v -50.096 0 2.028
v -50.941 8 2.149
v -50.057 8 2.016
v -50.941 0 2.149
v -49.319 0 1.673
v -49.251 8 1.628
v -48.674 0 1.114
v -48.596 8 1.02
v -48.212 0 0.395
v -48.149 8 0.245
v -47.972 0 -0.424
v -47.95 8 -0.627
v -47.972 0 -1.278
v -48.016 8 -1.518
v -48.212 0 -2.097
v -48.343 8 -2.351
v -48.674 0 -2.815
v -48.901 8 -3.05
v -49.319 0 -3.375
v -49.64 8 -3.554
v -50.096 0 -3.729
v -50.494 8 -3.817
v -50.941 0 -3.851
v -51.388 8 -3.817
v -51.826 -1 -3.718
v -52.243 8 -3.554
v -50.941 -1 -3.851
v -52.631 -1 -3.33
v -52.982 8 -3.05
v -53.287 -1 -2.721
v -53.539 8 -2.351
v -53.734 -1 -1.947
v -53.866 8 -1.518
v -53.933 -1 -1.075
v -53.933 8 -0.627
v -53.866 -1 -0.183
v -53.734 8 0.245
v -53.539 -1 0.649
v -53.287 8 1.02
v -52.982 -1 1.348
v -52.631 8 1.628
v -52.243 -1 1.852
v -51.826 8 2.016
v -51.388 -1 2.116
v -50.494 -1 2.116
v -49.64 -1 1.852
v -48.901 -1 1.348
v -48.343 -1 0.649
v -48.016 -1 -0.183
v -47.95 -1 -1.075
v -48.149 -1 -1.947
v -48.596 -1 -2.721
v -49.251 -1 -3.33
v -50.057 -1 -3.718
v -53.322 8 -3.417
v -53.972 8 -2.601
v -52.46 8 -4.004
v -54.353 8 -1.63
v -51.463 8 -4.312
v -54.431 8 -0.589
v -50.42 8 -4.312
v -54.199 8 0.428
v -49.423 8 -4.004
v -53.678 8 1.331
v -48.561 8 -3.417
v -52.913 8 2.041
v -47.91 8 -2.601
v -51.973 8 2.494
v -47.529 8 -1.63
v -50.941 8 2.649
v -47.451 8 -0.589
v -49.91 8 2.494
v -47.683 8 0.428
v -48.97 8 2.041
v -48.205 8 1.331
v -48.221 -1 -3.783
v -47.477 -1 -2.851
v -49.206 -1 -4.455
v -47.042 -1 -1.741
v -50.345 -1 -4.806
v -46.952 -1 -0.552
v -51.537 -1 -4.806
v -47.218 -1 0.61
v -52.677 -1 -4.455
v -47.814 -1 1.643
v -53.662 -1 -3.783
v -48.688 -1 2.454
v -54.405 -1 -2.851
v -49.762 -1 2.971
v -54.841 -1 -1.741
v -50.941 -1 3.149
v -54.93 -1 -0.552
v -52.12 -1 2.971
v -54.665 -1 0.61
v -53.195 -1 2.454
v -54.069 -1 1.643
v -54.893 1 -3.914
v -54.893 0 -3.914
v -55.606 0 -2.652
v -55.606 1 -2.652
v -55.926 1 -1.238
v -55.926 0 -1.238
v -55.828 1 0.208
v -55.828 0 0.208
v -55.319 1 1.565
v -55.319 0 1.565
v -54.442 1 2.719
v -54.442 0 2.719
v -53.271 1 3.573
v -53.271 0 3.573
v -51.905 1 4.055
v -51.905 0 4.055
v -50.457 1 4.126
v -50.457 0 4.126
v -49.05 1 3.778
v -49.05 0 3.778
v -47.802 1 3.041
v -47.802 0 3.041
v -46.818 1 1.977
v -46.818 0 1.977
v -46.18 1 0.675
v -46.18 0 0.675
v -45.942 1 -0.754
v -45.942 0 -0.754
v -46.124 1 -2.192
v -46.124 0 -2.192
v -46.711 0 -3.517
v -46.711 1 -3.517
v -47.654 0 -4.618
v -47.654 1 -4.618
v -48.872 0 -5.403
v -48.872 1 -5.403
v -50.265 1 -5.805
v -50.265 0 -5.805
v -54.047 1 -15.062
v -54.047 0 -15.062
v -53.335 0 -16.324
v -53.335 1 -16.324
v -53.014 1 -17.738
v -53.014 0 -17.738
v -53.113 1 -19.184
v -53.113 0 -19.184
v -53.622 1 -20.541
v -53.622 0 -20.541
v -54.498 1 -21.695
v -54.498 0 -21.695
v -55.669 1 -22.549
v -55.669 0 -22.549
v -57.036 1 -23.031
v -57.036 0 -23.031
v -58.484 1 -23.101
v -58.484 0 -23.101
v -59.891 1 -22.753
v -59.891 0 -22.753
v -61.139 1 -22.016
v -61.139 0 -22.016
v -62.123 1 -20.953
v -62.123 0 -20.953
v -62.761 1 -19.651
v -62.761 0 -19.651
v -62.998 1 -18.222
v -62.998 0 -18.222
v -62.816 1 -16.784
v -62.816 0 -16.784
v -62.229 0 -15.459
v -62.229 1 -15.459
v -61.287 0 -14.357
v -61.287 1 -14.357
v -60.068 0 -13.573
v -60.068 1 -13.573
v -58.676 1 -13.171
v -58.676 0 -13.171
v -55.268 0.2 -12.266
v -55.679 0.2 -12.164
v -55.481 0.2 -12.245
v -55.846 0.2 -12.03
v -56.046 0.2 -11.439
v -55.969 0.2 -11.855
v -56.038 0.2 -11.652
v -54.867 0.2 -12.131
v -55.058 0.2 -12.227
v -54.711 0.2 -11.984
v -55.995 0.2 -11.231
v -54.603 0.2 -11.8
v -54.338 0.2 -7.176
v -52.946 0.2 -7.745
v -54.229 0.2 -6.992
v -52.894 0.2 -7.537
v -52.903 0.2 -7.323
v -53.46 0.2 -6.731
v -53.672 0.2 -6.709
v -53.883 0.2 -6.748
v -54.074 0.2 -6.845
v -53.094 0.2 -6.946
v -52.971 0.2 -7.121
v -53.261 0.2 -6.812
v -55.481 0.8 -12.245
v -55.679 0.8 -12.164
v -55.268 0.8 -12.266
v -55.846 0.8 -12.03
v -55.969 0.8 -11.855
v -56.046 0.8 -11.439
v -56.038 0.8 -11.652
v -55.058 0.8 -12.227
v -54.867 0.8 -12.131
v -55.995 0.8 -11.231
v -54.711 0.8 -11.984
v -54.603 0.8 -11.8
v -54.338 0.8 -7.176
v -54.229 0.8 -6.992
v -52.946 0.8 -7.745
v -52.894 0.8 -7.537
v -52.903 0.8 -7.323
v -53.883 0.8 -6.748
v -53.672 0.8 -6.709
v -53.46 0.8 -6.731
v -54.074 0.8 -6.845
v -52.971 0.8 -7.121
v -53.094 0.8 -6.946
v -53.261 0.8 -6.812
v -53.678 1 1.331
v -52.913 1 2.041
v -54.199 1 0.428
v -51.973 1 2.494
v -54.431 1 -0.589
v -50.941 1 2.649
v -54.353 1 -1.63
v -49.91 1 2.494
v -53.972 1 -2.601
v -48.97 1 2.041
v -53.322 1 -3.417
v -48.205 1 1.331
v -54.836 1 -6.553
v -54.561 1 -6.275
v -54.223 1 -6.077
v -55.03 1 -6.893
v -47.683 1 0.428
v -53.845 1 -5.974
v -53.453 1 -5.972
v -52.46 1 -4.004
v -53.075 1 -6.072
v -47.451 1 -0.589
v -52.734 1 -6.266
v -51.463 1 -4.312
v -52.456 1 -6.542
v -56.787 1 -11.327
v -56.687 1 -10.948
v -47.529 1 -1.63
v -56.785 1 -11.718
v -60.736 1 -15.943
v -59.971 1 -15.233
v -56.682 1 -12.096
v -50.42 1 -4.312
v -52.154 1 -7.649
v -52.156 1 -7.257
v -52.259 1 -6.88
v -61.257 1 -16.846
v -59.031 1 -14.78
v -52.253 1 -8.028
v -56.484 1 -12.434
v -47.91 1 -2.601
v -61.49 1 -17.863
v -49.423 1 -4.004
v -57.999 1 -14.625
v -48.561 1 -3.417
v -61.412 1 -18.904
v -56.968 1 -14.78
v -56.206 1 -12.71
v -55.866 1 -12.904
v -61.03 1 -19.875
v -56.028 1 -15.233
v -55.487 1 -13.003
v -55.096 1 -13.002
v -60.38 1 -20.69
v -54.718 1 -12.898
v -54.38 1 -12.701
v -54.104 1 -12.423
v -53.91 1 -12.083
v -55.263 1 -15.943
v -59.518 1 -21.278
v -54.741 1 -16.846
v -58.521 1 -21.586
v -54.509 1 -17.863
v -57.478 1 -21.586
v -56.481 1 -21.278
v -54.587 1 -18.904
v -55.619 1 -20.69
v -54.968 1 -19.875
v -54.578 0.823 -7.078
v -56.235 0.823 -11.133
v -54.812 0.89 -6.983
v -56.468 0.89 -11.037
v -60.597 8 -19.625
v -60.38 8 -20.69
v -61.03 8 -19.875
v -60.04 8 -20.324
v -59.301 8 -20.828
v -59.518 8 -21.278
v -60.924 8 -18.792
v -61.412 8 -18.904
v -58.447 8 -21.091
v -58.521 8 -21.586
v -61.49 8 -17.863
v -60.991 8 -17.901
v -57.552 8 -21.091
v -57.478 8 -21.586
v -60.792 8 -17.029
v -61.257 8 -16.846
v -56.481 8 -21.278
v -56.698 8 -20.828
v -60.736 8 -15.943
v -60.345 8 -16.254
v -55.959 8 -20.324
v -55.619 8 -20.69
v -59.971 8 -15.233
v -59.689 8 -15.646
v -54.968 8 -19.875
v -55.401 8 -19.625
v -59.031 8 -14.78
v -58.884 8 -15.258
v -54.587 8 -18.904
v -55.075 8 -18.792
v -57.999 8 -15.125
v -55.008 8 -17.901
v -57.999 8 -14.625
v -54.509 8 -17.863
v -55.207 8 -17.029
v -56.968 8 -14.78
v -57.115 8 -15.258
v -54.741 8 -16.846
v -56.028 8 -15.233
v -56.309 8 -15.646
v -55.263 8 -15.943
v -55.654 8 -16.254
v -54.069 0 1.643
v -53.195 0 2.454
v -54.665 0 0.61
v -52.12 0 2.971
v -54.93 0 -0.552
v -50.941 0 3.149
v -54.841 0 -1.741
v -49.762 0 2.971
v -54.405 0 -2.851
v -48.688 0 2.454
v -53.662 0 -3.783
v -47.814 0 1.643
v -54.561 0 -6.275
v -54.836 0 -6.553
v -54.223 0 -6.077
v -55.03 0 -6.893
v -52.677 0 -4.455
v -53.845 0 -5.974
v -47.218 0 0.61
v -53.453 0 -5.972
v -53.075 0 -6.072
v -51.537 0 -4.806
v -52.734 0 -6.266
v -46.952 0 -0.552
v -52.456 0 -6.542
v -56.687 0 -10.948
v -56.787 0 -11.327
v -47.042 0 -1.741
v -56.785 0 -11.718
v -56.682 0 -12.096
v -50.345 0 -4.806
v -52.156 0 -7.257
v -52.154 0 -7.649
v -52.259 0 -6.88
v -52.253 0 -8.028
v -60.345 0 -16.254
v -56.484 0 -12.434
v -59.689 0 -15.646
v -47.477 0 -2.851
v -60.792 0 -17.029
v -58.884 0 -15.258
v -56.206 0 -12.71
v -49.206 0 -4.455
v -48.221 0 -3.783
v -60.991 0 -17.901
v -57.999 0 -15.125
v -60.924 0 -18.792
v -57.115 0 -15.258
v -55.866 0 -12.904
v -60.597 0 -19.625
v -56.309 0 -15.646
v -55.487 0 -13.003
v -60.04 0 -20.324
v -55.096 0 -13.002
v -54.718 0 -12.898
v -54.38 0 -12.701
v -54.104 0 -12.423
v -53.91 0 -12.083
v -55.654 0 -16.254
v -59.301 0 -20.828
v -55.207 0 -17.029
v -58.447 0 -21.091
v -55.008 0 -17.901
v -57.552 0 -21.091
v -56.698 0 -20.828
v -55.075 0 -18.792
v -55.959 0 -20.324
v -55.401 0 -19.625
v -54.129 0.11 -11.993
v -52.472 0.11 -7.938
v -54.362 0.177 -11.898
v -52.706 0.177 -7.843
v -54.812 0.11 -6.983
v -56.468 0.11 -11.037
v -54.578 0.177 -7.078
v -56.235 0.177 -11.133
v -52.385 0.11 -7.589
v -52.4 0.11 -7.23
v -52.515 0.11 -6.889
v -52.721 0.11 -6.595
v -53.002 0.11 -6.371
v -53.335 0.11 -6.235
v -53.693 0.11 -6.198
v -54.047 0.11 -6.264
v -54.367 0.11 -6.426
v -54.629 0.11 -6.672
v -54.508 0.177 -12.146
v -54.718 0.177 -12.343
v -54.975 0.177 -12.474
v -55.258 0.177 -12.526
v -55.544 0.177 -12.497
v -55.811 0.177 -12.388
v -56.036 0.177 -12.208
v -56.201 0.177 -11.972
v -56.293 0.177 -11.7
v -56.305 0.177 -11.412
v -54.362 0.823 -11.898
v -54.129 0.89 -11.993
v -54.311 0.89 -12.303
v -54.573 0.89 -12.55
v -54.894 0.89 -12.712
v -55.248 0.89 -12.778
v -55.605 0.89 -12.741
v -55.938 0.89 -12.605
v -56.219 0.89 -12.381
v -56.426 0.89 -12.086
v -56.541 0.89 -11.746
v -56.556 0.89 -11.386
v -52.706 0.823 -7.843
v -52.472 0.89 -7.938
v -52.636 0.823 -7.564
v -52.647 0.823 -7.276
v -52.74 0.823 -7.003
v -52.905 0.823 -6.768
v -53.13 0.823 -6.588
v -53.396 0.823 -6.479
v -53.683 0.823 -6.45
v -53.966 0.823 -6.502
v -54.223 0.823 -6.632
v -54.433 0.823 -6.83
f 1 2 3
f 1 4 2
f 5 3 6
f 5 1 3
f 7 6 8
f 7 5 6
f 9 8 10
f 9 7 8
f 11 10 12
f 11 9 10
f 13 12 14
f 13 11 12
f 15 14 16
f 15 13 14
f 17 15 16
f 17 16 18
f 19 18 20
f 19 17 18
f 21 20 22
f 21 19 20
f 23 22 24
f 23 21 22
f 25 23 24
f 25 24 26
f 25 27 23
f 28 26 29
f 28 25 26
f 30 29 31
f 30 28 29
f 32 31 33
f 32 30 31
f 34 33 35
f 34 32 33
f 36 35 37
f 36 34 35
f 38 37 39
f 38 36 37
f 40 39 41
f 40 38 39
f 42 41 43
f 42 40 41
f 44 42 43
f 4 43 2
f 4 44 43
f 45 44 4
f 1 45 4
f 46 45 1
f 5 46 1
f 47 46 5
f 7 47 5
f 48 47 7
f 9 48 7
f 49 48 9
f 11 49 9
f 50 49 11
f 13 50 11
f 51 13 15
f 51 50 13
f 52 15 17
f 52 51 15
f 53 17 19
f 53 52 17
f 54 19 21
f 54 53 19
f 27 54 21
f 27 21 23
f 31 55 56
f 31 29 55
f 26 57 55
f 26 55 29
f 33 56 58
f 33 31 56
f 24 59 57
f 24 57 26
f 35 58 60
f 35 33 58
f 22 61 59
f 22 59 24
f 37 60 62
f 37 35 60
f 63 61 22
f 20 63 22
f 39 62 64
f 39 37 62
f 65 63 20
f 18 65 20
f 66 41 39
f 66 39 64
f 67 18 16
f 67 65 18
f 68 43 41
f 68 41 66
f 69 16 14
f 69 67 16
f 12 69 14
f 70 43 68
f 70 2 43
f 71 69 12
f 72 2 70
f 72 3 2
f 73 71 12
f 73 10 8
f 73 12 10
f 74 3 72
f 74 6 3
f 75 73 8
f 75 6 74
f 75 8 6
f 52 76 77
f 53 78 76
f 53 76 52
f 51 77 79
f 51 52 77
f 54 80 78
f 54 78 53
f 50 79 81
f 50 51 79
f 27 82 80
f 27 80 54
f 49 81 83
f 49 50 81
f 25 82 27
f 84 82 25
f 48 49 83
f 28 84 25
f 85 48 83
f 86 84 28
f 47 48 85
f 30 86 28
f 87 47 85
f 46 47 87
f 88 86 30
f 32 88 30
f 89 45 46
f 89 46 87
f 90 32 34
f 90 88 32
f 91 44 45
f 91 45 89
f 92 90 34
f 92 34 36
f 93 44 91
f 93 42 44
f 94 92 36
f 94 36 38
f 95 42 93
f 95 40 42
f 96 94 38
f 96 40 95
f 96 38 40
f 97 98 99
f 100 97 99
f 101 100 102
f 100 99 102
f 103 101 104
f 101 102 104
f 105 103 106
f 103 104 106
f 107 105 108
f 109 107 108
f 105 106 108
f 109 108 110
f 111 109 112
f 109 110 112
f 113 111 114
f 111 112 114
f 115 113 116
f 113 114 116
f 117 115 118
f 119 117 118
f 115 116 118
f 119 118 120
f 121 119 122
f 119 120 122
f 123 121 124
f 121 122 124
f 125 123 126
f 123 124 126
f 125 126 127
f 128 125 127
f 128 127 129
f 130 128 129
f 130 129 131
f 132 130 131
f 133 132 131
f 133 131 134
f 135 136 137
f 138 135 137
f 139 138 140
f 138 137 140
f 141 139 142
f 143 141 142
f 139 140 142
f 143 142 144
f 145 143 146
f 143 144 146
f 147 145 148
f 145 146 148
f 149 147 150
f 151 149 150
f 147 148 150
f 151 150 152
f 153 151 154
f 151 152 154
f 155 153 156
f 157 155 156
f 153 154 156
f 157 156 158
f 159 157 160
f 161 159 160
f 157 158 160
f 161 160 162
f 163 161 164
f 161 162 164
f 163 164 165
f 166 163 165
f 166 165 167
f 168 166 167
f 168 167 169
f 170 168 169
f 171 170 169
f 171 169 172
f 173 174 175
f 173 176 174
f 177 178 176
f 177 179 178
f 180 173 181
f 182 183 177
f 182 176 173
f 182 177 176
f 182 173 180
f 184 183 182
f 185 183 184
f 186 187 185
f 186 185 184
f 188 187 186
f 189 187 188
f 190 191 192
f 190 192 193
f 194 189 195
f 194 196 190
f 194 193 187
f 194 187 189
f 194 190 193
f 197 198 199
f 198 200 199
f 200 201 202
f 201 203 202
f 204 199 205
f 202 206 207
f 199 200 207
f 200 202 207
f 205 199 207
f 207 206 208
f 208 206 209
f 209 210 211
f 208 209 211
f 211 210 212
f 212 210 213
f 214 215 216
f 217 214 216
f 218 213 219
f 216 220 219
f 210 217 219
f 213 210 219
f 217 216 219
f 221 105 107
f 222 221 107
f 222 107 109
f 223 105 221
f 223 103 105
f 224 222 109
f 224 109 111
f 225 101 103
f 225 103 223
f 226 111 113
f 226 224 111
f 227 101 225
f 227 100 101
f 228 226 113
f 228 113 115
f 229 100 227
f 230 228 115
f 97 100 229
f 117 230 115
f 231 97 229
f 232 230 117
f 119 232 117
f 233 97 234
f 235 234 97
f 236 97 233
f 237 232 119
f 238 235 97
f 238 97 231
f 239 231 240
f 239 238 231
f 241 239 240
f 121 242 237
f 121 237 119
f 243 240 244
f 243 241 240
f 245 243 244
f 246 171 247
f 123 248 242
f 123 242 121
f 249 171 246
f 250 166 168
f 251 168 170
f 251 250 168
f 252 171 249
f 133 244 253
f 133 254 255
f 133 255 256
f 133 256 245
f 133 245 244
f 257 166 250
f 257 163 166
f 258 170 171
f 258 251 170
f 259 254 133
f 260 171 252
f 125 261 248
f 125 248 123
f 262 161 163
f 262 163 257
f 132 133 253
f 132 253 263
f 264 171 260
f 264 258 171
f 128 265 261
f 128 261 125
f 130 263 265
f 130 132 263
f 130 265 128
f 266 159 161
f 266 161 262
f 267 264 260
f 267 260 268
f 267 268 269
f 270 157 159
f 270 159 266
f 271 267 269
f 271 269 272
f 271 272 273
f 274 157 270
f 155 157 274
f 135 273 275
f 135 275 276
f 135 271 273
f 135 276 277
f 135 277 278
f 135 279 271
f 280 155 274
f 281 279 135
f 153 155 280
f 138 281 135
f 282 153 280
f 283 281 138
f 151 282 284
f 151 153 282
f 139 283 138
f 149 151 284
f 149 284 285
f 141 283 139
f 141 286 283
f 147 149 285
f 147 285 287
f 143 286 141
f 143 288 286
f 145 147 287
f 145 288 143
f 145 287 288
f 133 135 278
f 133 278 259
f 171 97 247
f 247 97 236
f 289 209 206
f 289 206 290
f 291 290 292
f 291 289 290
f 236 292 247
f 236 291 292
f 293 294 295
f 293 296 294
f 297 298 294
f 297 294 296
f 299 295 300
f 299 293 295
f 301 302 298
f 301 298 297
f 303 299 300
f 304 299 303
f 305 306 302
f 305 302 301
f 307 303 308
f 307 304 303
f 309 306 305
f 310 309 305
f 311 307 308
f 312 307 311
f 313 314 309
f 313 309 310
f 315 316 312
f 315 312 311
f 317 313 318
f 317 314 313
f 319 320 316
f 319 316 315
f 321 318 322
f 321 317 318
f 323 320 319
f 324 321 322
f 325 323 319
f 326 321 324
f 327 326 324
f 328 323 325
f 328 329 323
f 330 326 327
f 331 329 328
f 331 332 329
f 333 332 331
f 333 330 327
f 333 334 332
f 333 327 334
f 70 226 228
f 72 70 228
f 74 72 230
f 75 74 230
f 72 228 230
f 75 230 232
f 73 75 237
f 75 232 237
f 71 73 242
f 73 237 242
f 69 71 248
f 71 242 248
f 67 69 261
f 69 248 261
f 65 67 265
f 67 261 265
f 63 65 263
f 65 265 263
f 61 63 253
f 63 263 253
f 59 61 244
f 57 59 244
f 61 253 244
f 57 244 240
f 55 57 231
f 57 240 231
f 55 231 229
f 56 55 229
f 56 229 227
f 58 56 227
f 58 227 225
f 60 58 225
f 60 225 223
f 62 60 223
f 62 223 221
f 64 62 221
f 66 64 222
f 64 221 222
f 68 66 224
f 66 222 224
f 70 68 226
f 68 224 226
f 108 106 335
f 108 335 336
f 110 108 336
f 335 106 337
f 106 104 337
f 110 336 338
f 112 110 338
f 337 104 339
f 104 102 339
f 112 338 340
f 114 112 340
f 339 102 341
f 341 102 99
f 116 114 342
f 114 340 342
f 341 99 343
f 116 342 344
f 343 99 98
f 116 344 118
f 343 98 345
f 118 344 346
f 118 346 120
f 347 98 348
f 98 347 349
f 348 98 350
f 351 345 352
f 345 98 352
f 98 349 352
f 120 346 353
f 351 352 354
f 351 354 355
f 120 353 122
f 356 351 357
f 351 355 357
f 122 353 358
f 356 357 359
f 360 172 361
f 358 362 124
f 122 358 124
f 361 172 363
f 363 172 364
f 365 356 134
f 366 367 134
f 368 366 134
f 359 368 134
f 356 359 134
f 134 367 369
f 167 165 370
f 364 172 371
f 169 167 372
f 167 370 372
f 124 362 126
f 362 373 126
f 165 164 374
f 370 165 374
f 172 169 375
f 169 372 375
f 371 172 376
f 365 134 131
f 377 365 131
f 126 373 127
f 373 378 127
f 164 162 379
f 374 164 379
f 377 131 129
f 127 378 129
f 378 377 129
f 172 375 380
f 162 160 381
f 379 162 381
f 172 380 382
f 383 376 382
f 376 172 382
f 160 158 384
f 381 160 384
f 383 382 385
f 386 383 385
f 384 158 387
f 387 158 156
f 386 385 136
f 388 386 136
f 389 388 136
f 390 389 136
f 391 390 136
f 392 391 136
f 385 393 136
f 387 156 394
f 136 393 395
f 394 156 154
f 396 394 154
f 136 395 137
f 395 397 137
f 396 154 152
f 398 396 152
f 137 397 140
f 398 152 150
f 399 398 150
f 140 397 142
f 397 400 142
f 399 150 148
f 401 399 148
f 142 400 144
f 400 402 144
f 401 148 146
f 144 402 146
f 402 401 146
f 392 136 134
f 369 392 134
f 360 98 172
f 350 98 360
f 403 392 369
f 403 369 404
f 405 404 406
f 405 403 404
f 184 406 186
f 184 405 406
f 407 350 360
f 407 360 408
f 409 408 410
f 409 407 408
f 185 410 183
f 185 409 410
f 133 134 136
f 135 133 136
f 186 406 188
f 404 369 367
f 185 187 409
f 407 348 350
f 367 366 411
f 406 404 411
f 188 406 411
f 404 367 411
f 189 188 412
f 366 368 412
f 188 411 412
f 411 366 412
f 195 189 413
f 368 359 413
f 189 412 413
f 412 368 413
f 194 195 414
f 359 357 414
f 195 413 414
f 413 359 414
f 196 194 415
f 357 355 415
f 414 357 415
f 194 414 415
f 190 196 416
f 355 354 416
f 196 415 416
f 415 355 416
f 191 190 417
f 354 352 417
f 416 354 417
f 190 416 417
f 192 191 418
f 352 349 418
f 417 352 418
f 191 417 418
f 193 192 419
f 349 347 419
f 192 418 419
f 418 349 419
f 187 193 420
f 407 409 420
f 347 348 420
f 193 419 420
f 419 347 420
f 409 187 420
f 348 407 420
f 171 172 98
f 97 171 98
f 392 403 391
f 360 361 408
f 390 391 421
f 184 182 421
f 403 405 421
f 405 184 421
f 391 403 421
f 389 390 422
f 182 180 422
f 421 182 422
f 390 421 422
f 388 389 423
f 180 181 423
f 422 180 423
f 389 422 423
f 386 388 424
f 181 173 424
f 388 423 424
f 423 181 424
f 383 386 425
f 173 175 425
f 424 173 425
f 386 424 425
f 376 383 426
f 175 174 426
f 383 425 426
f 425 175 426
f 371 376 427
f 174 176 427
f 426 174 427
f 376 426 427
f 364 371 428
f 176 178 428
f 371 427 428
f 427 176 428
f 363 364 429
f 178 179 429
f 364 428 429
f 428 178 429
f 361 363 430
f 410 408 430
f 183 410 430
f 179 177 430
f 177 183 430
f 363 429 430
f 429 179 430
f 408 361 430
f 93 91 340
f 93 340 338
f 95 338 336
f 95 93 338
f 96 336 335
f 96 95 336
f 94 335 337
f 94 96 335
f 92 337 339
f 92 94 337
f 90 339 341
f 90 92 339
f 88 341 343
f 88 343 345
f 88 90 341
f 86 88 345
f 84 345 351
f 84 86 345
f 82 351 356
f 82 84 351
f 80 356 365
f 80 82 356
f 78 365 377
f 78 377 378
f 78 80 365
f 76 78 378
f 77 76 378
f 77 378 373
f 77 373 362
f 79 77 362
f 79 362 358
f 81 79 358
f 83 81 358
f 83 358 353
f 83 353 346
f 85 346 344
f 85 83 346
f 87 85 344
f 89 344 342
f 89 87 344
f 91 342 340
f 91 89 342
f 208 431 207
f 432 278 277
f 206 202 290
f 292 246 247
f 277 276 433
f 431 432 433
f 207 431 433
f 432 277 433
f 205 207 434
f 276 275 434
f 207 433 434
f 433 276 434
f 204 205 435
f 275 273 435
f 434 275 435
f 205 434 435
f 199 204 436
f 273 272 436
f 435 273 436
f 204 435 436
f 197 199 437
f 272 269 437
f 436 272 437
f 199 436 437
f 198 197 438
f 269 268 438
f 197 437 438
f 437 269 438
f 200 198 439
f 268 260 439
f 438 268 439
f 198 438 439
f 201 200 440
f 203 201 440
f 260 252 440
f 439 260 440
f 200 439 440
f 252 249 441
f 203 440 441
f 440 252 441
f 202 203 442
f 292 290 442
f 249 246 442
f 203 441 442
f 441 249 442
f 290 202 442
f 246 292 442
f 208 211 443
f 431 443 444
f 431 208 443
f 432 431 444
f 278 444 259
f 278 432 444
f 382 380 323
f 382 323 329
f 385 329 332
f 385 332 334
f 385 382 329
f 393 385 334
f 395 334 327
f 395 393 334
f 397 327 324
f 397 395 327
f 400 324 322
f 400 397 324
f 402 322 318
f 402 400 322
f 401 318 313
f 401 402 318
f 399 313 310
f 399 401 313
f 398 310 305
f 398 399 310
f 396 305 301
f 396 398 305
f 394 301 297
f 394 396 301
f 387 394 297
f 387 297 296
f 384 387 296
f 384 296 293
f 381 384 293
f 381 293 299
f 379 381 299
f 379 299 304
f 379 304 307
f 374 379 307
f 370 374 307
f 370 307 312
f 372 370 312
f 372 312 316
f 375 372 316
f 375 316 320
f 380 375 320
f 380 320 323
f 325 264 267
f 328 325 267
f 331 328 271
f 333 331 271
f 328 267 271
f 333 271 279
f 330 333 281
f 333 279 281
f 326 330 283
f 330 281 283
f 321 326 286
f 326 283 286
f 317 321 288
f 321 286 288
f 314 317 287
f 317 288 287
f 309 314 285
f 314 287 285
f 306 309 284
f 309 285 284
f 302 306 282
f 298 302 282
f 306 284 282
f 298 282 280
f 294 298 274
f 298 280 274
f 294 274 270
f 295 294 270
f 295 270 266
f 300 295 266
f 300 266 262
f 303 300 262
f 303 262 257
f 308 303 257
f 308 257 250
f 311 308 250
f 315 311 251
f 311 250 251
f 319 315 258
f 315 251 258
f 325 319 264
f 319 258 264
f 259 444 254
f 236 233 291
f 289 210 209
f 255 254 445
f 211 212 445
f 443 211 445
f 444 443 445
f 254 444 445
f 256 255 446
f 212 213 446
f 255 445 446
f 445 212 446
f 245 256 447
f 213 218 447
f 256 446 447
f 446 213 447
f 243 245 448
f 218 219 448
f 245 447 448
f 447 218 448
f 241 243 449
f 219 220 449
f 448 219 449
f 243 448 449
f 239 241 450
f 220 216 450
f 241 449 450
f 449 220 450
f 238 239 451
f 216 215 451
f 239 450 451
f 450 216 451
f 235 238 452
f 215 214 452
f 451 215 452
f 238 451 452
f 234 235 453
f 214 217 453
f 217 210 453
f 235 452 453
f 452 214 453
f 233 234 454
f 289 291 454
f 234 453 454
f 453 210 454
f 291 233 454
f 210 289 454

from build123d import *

# Parameters (mm, degrees)
CROQUIS1_R               = 3
SALIENTE_EXTRUIR1_DEPTH  = 1
CROQUIS2_R               = 3.5
CROQUIS2_R_2             = 3
SALIENTE_EXTRUIR2_DEPTH  = 7
SALIENTE_EXTRUIR3_START  = 1
CROQUIS3_R               = 4
CROQUIS3_R_2             = 3
SALIENTE_EXTRUIR3_DEPTH  = 1
CORTAR_EXTRUIR3_DEPTH    = 0.2
REDONDEO4_R              = 1.5
REDONDEO4_OF_SIMETR_A4_R = 1.5


with BuildPart() as part:
    # Croquis1 → Saliente-Extruir1 (new body)
    with BuildSketch(Plane(origin=(0, 0, 0), x_dir=(1, 0, 0), z_dir=(0, 1, 0))):
        with BuildLine():
            Line((-50.264827345, 5.804943896), (-54.04727716, 15.061999227))
            ThreePointArc((-54.04727716, 15.061999227), (-59.890614713, 22.75333698), (-58.675804825, 13.17077432))
            Line((-58.675804825, 13.17077432), (-54.893355011, 3.913718989))
            ThreePointArc((-54.893355011, 3.913718989), (-49.050017457, -3.777618763), (-50.264827345, 5.804943896))
        make_face()
        with Locations(Location((-57.999389806, 18.124809314, 0), (0, 0, 270))):
            Circle(CROQUIS1_R, mode=Mode.SUBTRACT)
        with Locations(Location((-50.941242364, 0.850908902, 0), (0, 0, 270))):
            Circle(CROQUIS1_R, mode=Mode.SUBTRACT)
    extrude(amount=SALIENTE_EXTRUIR1_DEPTH)

    # Croquis2 → Saliente-Extruir2 (add)
    # profile 1 of 2: a face of its own
    with BuildSketch(Plane(origin=(0, 1, 0), x_dir=(1, 0, 0), z_dir=(0, 1, 0))):
        with Locations(Location((-50.941242364, 0.850908902, 0), (0, 0, 270))):
            Circle(CROQUIS2_R)
        with Locations(Location((-50.941242364, 0.850908902, 0), (0, 0, 270))):
            Circle(CROQUIS2_R_2, mode=Mode.SUBTRACT)
    # profile 2 of 2: a face of its own
    with BuildSketch(Plane(origin=(0, 1, 0), x_dir=(1, 0, 0), z_dir=(0, 1, 0))):
        with Locations(Location((-57.999389806, 18.124809314, 0), (0, 0, 270))):
            Circle(CROQUIS2_R)
        with Locations(Location((-57.999389806, 18.124809314, 0), (0, 0, 270))):
            Circle(CROQUIS2_R_2, mode=Mode.SUBTRACT)
    extrude(amount=SALIENTE_EXTRUIR2_DEPTH)

    # Croquis3 → Saliente-Extruir3 (add)
    with BuildSketch(Plane.XZ.offset(SALIENTE_EXTRUIR3_START)):
        with Locations(Location((-50.941242364, -0.850908902, 0), (0, 0, 90))):
            Circle(CROQUIS3_R)
        with Locations(Location((-50.941242364, -0.850908902, 0), (0, 0, 270))):
            Circle(CROQUIS3_R_2, mode=Mode.SUBTRACT)
    extrude(amount=-SALIENTE_EXTRUIR3_DEPTH)

    # Croquis4 → Cortar-Extruir3 (cut)
    with BuildSketch(Plane.XZ):
        with BuildLine():
            Line((-55.03045688, -6.89304724), (-53.64189858, -7.460414712))
            Line((-53.64189858, -7.460414712), (-53.074531108, -6.071856412))
            ThreePointArc((-53.074531108, -6.071856412), (-54.222568183, -6.077366335), (-55.03045688, -6.89304724))
        make_face()
        with BuildLine():
            Line((-53.074531108, -6.071856412), (-53.64189858, -7.460414712))
            Line((-53.64189858, -7.460414712), (-52.253340281, -8.027782184))
            ThreePointArc((-52.253340281, -8.027782184), (-52.258850203, -6.879745109), (-53.074531108, -6.071856412))
        make_face()
        Polygon((-52.253340281, -8.027782184), (-53.64189858, -7.460414712), (-55.29873359, -11.515303505), (-53.91017529, -12.082670977), align=None)
        Polygon((-55.29873359, -11.515303505), (-53.64189858, -7.460414712), (-55.03045688, -6.89304724), (-56.68729189, -10.947936033), align=None)
        with BuildLine():
            Line((-53.91017529, -12.082670977), (-55.29873359, -11.515303505))
            Line((-55.29873359, -11.515303505), (-55.866101062, -12.903861804))
            ThreePointArc((-55.866101062, -12.903861804), (-54.718063987, -12.898351882), (-53.91017529, -12.082670977))
        make_face()
        with BuildLine():
            Line((-55.866101062, -12.903861804), (-55.29873359, -11.515303505))
            Line((-55.29873359, -11.515303505), (-56.68729189, -10.947936033))
            ThreePointArc((-56.68729189, -10.947936033), (-56.681781967, -12.095973108), (-55.866101062, -12.903861804))
        make_face()
    cortar_extruir3 = extrude(amount=-CORTAR_EXTRUIR3_DEPTH, mode=Mode.SUBTRACT)

    # Redondeo4
    # the kernel refuses this fillet: 1.5 mm, written as the material it adds along each edge
    with BuildSketch(Plane(origin=(-55.29873359, 0.2, -11.515303505), x_dir=(0.9257055331084191, 0, -0.3782449814240206), z_dir=(0.3782449814240206, 0, 0.9257055331084191))) as redondeo4_piece_1:
        with BuildLine():
            CenterArc((0.751668523, -1.5), REDONDEO4_R, 60.073565133, 29.926434867)
            Line((0.751668523, 0), (0.751668523, 0.03))
            Line((0.751668523, 0.03), (1.5, 0.03))
            Line((1.5, 0.03), (1.53, 0))
            ThreePointArc((1.53, 0), (1.53, -0.1), (1.51496663, -0.174))
            Line((1.51496663, -0.174), (1.5, -0.2))
        make_face()
    revolve(axis=Axis((-55.29873359, 0.2, -11.515303505), (0, 1, 0)), revolution_arc=180)
    with BuildSketch(Plane(origin=(-53.91017529, 0.2, -12.082670977), x_dir=(0, -1, 0), z_dir=(0.37824498142401725, 0, 0.9257055331084204)), Plane(origin=(-55.03045688, 0.2, -6.89304724), x_dir=(0, -1, 0), z_dir=(-0.3782449814240187, 0, -0.9257055331084199))) as redondeo4_piece_2:
        with BuildLine():
            CenterArc((1.5, -0.748331477), REDONDEO4_R, 150.073565133, 29.926434867)
            Line((0, -0.748331477), (-0.03, -0.748331477))
            Line((-0.03, -0.748331477), (-0.03, 0))
            Line((-0.03, 0), (0, 0.03))
            ThreePointArc((0, 0.03), (0.1, 0.03), (0.174, 0.01496663))
            Line((0.174, 0.01496663), (0.2, 0))
        make_face()
    extrude(amount=4.380322519)
    with BuildSketch(Plane(origin=(-53.64189858, 0.2, -7.460414712), x_dir=(0.9257055331084226, 0, -0.378244981424012), z_dir=(-0.378244981424012, 0, -0.9257055331084226))) as redondeo4_piece_3:
        with BuildLine():
            CenterArc((0.751668523, 1.5), REDONDEO4_R, 270, 29.926434867)
            Line((0.751668523, 0), (0.751668523, -0.03))
            Line((0.751668523, -0.03), (1.5, -0.03))
            Line((1.5, -0.03), (1.53, 0))
            ThreePointArc((1.53, 0), (1.53, 0.1), (1.51496663, 0.174))
            Line((1.51496663, 0.174), (1.5, 0.2))
        make_face()
    revolve(axis=Axis((-53.64189858, 0.2, -7.460414712), (0, -1, 0)), revolution_arc=180)

    # Simetría4: Cortar-Extruir3 across plane
    add(cortar_extruir3.mirror(Plane(origin=(0, 0.5, 0), x_dir=(0, 0, 1), z_dir=(0, -1, 0))), mode=Mode.SUBTRACT)

    # Redondeo4 of Simetría4
    # the kernel refuses this fillet: 1.5 mm, written as the material it adds along each edge
    with BuildSketch(Plane(origin=(-55.29873359, 0.8, -11.515303505), x_dir=(0.9257055331084191, 0, -0.3782449814240206), z_dir=(0.3782449814240206, 0, 0.9257055331084191))) as redondeo4_of_simetr_a4_piece_1:
        with BuildLine():
            CenterArc((0.751668523, 1.5), REDONDEO4_OF_SIMETR_A4_R, 270, 29.926434867)
            Line((0.751668523, 0), (0.751668523, -0.03))
            Line((0.751668523, -0.03), (1.5, -0.03))
            Line((1.5, -0.03), (1.53, 0))
            ThreePointArc((1.53, 0), (1.53, 0.1), (1.51496663, 0.174))
            Line((1.51496663, 0.174), (1.5, 0.2))
        make_face()
    revolve(axis=Axis((-55.29873359, 0.8, -11.515303505), (0, 1, 0)), revolution_arc=180)
    with BuildSketch(Plane(origin=(-53.91017529, 0.8, -12.082670977), x_dir=(0, 1, 0), z_dir=(0.37824498142401725, 0, 0.9257055331084204)), Plane(origin=(-55.03045688, 0.8, -6.89304724), x_dir=(0, 1, 0), z_dir=(-0.3782449814240187, 0, -0.9257055331084199))) as redondeo4_of_simetr_a4_piece_2:
        with BuildLine():
            CenterArc((1.5, 0.748331477), REDONDEO4_OF_SIMETR_A4_R, 180, 29.926434867)
            Line((0, 0.748331477), (-0.03, 0.748331477))
            Line((-0.03, 0.748331477), (-0.03, 0))
            Line((-0.03, 0), (0, -0.03))
            ThreePointArc((0, -0.03), (0.1, -0.03), (0.174, -0.01496663))
            Line((0.174, -0.01496663), (0.2, 0))
        make_face()
    extrude(amount=4.380322519)
    with BuildSketch(Plane(origin=(-53.64189858, 0.8, -7.460414712), x_dir=(0.9257055331084226, 0, -0.378244981424012), z_dir=(-0.378244981424012, 0, -0.9257055331084226))) as redondeo4_of_simetr_a4_piece_3:
        with BuildLine():
            CenterArc((0.751668523, -1.5), REDONDEO4_OF_SIMETR_A4_R, 60.073565133, 29.926434867)
            Line((0.751668523, 0), (0.751668523, 0.03))
            Line((0.751668523, 0.03), (1.5, 0.03))
            Line((1.5, 0.03), (1.53, 0))
            ThreePointArc((1.53, 0), (1.53, -0.1), (1.51496663, -0.174))
            Line((1.51496663, -0.174), (1.5, -0.2))
        make_face()
    revolve(axis=Axis((-53.64189858, 0.8, -7.460414712), (0, -1, 0)), revolution_arc=180)


solid = part.part
